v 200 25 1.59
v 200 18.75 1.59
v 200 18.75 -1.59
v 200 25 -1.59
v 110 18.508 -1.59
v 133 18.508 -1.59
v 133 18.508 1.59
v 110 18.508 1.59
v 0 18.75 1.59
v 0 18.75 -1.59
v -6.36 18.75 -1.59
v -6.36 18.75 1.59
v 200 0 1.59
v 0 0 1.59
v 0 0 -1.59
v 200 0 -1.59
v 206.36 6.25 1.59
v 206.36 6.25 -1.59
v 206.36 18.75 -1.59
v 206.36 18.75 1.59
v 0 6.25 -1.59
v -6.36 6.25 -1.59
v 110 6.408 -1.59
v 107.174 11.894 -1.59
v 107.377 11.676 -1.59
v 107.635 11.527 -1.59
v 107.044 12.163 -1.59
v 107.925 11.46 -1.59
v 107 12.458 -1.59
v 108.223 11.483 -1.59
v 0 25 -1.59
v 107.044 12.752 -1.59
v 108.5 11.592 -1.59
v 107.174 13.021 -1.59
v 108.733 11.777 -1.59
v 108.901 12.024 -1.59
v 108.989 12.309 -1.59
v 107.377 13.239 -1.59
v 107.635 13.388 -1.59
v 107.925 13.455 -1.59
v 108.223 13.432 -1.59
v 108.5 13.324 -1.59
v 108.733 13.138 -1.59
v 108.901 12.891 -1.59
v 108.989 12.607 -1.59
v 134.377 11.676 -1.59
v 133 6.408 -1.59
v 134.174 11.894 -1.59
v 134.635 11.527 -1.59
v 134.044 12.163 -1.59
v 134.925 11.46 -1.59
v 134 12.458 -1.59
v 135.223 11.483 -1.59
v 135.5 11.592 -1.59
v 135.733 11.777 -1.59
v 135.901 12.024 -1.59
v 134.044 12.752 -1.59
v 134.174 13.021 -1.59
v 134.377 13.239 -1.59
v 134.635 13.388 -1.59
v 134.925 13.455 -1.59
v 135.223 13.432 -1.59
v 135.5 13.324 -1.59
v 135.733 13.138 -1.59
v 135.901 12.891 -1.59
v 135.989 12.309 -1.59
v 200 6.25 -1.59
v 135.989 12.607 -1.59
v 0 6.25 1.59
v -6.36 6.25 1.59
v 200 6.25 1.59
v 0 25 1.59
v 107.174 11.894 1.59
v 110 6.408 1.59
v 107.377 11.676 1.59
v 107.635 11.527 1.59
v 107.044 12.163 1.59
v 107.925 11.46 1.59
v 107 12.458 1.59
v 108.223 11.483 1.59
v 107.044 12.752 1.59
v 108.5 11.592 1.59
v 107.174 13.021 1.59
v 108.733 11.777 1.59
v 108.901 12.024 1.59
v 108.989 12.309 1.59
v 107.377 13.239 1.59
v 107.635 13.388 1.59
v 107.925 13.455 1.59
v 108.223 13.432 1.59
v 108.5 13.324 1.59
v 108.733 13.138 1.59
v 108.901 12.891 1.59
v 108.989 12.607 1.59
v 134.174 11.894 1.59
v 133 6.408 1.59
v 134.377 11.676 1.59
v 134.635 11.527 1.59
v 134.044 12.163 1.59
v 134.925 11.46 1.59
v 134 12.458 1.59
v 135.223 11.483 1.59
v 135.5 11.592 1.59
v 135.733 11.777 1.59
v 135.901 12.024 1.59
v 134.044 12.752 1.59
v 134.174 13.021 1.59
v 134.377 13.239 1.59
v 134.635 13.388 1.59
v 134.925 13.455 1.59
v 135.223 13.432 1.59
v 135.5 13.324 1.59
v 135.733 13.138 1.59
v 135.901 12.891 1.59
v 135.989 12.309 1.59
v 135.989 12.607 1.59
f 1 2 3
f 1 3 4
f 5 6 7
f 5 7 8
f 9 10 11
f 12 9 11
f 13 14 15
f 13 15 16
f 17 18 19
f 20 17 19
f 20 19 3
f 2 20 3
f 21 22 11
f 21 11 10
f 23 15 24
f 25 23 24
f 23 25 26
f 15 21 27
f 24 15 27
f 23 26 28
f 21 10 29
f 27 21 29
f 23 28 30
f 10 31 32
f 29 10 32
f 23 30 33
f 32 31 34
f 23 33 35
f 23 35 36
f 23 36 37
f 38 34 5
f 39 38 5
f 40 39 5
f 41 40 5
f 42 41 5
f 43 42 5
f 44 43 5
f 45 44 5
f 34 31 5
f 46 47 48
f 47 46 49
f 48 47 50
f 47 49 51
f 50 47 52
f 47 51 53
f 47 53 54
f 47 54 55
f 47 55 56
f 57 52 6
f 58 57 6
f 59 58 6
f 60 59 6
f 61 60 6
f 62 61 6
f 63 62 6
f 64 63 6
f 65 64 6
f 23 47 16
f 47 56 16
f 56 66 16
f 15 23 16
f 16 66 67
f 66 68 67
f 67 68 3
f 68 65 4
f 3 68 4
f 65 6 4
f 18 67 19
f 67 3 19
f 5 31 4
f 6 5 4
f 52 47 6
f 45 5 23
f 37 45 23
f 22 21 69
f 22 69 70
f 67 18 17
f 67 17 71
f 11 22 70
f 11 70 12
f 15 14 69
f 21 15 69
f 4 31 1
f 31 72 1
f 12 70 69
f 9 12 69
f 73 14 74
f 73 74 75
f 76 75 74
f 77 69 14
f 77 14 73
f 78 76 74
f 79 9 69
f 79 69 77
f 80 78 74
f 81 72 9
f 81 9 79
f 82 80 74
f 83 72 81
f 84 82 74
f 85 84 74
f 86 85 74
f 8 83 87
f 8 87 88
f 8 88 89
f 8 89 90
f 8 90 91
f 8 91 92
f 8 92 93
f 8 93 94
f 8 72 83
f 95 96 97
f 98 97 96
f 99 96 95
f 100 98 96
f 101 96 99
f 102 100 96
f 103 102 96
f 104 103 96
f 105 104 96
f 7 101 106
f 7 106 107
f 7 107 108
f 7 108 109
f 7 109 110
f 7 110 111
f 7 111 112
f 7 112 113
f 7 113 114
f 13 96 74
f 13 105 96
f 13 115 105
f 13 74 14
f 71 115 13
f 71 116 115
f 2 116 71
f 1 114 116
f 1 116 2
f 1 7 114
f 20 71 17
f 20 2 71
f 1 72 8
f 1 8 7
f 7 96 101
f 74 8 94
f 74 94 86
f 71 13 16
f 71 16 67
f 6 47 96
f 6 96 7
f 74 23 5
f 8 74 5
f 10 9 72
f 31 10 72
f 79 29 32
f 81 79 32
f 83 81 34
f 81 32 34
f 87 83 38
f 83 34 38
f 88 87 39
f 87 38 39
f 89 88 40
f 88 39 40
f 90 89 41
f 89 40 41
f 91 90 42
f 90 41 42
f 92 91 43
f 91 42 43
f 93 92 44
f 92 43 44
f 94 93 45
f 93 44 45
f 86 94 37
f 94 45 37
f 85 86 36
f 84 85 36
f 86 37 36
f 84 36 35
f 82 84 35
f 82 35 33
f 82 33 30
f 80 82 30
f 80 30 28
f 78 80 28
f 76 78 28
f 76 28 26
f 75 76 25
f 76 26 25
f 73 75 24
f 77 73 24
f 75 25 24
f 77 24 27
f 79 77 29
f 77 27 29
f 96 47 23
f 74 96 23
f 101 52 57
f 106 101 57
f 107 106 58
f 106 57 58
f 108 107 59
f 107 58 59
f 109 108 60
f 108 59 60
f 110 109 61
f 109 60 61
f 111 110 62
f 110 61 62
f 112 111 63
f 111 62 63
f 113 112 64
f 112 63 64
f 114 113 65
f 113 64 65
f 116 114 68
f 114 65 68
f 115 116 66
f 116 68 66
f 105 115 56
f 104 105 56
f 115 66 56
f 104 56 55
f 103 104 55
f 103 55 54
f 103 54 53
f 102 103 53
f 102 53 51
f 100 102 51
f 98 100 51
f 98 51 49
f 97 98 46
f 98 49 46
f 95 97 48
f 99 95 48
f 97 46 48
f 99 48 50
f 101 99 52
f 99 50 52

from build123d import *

# Parameters (mm, degrees)
SKETCH2_W           = 200
SKETCH2_H           = 25
BOSS_EXTRUDE1_DEPTH = 1.59
SKETCH4_R           = 1
SKETCH4_W           = 23
SKETCH4_H           = 12.1
CUT_EXTRUDE1_DEPTH  = 3.18
SKETCH5_W           = 6.36
SKETCH5_H           = 12.5
BOSS_EXTRUDE2_DEPTH = 3.18


with BuildPart() as part:
    # Sketch2 → Boss-Extrude1 (new, symmetric)
    with BuildSketch(Plane.XY):
        with Locations((100, 12.5)):
            Rectangle(SKETCH2_W, SKETCH2_H)
    extrude(amount=BOSS_EXTRUDE1_DEPTH, both=True)

    # Sketch4 → Cut-Extrude1 (cut)
    with BuildSketch(Plane(origin=(0, 0, -1.59), x_dir=(-1, 0, 0), z_dir=(0, 0, -1))):
        with Locations((-135, 12.457546073)):
            Circle(SKETCH4_R)
        with Locations((-108, 12.457546073)):
            Circle(SKETCH4_R)
        with Locations((-121.5, 12.457546073)):
            Rectangle(SKETCH4_W, SKETCH4_H)
    extrude(amount=-CUT_EXTRUDE1_DEPTH, mode=Mode.SUBTRACT)

    # Sketch5 → Boss-Extrude2 (add)
    with BuildSketch(Plane(origin=(0, 0, -1.59), x_dir=(-1, 0, 0), z_dir=(0, 0, -1))):
        with Locations((-203.18, 12.5)):
            Rectangle(SKETCH5_W, SKETCH5_H)
        with Locations((3.18, 12.5)):
            Rectangle(SKETCH5_W, SKETCH5_H)
    extrude(amount=-BOSS_EXTRUDE2_DEPTH)


solid = part.part
